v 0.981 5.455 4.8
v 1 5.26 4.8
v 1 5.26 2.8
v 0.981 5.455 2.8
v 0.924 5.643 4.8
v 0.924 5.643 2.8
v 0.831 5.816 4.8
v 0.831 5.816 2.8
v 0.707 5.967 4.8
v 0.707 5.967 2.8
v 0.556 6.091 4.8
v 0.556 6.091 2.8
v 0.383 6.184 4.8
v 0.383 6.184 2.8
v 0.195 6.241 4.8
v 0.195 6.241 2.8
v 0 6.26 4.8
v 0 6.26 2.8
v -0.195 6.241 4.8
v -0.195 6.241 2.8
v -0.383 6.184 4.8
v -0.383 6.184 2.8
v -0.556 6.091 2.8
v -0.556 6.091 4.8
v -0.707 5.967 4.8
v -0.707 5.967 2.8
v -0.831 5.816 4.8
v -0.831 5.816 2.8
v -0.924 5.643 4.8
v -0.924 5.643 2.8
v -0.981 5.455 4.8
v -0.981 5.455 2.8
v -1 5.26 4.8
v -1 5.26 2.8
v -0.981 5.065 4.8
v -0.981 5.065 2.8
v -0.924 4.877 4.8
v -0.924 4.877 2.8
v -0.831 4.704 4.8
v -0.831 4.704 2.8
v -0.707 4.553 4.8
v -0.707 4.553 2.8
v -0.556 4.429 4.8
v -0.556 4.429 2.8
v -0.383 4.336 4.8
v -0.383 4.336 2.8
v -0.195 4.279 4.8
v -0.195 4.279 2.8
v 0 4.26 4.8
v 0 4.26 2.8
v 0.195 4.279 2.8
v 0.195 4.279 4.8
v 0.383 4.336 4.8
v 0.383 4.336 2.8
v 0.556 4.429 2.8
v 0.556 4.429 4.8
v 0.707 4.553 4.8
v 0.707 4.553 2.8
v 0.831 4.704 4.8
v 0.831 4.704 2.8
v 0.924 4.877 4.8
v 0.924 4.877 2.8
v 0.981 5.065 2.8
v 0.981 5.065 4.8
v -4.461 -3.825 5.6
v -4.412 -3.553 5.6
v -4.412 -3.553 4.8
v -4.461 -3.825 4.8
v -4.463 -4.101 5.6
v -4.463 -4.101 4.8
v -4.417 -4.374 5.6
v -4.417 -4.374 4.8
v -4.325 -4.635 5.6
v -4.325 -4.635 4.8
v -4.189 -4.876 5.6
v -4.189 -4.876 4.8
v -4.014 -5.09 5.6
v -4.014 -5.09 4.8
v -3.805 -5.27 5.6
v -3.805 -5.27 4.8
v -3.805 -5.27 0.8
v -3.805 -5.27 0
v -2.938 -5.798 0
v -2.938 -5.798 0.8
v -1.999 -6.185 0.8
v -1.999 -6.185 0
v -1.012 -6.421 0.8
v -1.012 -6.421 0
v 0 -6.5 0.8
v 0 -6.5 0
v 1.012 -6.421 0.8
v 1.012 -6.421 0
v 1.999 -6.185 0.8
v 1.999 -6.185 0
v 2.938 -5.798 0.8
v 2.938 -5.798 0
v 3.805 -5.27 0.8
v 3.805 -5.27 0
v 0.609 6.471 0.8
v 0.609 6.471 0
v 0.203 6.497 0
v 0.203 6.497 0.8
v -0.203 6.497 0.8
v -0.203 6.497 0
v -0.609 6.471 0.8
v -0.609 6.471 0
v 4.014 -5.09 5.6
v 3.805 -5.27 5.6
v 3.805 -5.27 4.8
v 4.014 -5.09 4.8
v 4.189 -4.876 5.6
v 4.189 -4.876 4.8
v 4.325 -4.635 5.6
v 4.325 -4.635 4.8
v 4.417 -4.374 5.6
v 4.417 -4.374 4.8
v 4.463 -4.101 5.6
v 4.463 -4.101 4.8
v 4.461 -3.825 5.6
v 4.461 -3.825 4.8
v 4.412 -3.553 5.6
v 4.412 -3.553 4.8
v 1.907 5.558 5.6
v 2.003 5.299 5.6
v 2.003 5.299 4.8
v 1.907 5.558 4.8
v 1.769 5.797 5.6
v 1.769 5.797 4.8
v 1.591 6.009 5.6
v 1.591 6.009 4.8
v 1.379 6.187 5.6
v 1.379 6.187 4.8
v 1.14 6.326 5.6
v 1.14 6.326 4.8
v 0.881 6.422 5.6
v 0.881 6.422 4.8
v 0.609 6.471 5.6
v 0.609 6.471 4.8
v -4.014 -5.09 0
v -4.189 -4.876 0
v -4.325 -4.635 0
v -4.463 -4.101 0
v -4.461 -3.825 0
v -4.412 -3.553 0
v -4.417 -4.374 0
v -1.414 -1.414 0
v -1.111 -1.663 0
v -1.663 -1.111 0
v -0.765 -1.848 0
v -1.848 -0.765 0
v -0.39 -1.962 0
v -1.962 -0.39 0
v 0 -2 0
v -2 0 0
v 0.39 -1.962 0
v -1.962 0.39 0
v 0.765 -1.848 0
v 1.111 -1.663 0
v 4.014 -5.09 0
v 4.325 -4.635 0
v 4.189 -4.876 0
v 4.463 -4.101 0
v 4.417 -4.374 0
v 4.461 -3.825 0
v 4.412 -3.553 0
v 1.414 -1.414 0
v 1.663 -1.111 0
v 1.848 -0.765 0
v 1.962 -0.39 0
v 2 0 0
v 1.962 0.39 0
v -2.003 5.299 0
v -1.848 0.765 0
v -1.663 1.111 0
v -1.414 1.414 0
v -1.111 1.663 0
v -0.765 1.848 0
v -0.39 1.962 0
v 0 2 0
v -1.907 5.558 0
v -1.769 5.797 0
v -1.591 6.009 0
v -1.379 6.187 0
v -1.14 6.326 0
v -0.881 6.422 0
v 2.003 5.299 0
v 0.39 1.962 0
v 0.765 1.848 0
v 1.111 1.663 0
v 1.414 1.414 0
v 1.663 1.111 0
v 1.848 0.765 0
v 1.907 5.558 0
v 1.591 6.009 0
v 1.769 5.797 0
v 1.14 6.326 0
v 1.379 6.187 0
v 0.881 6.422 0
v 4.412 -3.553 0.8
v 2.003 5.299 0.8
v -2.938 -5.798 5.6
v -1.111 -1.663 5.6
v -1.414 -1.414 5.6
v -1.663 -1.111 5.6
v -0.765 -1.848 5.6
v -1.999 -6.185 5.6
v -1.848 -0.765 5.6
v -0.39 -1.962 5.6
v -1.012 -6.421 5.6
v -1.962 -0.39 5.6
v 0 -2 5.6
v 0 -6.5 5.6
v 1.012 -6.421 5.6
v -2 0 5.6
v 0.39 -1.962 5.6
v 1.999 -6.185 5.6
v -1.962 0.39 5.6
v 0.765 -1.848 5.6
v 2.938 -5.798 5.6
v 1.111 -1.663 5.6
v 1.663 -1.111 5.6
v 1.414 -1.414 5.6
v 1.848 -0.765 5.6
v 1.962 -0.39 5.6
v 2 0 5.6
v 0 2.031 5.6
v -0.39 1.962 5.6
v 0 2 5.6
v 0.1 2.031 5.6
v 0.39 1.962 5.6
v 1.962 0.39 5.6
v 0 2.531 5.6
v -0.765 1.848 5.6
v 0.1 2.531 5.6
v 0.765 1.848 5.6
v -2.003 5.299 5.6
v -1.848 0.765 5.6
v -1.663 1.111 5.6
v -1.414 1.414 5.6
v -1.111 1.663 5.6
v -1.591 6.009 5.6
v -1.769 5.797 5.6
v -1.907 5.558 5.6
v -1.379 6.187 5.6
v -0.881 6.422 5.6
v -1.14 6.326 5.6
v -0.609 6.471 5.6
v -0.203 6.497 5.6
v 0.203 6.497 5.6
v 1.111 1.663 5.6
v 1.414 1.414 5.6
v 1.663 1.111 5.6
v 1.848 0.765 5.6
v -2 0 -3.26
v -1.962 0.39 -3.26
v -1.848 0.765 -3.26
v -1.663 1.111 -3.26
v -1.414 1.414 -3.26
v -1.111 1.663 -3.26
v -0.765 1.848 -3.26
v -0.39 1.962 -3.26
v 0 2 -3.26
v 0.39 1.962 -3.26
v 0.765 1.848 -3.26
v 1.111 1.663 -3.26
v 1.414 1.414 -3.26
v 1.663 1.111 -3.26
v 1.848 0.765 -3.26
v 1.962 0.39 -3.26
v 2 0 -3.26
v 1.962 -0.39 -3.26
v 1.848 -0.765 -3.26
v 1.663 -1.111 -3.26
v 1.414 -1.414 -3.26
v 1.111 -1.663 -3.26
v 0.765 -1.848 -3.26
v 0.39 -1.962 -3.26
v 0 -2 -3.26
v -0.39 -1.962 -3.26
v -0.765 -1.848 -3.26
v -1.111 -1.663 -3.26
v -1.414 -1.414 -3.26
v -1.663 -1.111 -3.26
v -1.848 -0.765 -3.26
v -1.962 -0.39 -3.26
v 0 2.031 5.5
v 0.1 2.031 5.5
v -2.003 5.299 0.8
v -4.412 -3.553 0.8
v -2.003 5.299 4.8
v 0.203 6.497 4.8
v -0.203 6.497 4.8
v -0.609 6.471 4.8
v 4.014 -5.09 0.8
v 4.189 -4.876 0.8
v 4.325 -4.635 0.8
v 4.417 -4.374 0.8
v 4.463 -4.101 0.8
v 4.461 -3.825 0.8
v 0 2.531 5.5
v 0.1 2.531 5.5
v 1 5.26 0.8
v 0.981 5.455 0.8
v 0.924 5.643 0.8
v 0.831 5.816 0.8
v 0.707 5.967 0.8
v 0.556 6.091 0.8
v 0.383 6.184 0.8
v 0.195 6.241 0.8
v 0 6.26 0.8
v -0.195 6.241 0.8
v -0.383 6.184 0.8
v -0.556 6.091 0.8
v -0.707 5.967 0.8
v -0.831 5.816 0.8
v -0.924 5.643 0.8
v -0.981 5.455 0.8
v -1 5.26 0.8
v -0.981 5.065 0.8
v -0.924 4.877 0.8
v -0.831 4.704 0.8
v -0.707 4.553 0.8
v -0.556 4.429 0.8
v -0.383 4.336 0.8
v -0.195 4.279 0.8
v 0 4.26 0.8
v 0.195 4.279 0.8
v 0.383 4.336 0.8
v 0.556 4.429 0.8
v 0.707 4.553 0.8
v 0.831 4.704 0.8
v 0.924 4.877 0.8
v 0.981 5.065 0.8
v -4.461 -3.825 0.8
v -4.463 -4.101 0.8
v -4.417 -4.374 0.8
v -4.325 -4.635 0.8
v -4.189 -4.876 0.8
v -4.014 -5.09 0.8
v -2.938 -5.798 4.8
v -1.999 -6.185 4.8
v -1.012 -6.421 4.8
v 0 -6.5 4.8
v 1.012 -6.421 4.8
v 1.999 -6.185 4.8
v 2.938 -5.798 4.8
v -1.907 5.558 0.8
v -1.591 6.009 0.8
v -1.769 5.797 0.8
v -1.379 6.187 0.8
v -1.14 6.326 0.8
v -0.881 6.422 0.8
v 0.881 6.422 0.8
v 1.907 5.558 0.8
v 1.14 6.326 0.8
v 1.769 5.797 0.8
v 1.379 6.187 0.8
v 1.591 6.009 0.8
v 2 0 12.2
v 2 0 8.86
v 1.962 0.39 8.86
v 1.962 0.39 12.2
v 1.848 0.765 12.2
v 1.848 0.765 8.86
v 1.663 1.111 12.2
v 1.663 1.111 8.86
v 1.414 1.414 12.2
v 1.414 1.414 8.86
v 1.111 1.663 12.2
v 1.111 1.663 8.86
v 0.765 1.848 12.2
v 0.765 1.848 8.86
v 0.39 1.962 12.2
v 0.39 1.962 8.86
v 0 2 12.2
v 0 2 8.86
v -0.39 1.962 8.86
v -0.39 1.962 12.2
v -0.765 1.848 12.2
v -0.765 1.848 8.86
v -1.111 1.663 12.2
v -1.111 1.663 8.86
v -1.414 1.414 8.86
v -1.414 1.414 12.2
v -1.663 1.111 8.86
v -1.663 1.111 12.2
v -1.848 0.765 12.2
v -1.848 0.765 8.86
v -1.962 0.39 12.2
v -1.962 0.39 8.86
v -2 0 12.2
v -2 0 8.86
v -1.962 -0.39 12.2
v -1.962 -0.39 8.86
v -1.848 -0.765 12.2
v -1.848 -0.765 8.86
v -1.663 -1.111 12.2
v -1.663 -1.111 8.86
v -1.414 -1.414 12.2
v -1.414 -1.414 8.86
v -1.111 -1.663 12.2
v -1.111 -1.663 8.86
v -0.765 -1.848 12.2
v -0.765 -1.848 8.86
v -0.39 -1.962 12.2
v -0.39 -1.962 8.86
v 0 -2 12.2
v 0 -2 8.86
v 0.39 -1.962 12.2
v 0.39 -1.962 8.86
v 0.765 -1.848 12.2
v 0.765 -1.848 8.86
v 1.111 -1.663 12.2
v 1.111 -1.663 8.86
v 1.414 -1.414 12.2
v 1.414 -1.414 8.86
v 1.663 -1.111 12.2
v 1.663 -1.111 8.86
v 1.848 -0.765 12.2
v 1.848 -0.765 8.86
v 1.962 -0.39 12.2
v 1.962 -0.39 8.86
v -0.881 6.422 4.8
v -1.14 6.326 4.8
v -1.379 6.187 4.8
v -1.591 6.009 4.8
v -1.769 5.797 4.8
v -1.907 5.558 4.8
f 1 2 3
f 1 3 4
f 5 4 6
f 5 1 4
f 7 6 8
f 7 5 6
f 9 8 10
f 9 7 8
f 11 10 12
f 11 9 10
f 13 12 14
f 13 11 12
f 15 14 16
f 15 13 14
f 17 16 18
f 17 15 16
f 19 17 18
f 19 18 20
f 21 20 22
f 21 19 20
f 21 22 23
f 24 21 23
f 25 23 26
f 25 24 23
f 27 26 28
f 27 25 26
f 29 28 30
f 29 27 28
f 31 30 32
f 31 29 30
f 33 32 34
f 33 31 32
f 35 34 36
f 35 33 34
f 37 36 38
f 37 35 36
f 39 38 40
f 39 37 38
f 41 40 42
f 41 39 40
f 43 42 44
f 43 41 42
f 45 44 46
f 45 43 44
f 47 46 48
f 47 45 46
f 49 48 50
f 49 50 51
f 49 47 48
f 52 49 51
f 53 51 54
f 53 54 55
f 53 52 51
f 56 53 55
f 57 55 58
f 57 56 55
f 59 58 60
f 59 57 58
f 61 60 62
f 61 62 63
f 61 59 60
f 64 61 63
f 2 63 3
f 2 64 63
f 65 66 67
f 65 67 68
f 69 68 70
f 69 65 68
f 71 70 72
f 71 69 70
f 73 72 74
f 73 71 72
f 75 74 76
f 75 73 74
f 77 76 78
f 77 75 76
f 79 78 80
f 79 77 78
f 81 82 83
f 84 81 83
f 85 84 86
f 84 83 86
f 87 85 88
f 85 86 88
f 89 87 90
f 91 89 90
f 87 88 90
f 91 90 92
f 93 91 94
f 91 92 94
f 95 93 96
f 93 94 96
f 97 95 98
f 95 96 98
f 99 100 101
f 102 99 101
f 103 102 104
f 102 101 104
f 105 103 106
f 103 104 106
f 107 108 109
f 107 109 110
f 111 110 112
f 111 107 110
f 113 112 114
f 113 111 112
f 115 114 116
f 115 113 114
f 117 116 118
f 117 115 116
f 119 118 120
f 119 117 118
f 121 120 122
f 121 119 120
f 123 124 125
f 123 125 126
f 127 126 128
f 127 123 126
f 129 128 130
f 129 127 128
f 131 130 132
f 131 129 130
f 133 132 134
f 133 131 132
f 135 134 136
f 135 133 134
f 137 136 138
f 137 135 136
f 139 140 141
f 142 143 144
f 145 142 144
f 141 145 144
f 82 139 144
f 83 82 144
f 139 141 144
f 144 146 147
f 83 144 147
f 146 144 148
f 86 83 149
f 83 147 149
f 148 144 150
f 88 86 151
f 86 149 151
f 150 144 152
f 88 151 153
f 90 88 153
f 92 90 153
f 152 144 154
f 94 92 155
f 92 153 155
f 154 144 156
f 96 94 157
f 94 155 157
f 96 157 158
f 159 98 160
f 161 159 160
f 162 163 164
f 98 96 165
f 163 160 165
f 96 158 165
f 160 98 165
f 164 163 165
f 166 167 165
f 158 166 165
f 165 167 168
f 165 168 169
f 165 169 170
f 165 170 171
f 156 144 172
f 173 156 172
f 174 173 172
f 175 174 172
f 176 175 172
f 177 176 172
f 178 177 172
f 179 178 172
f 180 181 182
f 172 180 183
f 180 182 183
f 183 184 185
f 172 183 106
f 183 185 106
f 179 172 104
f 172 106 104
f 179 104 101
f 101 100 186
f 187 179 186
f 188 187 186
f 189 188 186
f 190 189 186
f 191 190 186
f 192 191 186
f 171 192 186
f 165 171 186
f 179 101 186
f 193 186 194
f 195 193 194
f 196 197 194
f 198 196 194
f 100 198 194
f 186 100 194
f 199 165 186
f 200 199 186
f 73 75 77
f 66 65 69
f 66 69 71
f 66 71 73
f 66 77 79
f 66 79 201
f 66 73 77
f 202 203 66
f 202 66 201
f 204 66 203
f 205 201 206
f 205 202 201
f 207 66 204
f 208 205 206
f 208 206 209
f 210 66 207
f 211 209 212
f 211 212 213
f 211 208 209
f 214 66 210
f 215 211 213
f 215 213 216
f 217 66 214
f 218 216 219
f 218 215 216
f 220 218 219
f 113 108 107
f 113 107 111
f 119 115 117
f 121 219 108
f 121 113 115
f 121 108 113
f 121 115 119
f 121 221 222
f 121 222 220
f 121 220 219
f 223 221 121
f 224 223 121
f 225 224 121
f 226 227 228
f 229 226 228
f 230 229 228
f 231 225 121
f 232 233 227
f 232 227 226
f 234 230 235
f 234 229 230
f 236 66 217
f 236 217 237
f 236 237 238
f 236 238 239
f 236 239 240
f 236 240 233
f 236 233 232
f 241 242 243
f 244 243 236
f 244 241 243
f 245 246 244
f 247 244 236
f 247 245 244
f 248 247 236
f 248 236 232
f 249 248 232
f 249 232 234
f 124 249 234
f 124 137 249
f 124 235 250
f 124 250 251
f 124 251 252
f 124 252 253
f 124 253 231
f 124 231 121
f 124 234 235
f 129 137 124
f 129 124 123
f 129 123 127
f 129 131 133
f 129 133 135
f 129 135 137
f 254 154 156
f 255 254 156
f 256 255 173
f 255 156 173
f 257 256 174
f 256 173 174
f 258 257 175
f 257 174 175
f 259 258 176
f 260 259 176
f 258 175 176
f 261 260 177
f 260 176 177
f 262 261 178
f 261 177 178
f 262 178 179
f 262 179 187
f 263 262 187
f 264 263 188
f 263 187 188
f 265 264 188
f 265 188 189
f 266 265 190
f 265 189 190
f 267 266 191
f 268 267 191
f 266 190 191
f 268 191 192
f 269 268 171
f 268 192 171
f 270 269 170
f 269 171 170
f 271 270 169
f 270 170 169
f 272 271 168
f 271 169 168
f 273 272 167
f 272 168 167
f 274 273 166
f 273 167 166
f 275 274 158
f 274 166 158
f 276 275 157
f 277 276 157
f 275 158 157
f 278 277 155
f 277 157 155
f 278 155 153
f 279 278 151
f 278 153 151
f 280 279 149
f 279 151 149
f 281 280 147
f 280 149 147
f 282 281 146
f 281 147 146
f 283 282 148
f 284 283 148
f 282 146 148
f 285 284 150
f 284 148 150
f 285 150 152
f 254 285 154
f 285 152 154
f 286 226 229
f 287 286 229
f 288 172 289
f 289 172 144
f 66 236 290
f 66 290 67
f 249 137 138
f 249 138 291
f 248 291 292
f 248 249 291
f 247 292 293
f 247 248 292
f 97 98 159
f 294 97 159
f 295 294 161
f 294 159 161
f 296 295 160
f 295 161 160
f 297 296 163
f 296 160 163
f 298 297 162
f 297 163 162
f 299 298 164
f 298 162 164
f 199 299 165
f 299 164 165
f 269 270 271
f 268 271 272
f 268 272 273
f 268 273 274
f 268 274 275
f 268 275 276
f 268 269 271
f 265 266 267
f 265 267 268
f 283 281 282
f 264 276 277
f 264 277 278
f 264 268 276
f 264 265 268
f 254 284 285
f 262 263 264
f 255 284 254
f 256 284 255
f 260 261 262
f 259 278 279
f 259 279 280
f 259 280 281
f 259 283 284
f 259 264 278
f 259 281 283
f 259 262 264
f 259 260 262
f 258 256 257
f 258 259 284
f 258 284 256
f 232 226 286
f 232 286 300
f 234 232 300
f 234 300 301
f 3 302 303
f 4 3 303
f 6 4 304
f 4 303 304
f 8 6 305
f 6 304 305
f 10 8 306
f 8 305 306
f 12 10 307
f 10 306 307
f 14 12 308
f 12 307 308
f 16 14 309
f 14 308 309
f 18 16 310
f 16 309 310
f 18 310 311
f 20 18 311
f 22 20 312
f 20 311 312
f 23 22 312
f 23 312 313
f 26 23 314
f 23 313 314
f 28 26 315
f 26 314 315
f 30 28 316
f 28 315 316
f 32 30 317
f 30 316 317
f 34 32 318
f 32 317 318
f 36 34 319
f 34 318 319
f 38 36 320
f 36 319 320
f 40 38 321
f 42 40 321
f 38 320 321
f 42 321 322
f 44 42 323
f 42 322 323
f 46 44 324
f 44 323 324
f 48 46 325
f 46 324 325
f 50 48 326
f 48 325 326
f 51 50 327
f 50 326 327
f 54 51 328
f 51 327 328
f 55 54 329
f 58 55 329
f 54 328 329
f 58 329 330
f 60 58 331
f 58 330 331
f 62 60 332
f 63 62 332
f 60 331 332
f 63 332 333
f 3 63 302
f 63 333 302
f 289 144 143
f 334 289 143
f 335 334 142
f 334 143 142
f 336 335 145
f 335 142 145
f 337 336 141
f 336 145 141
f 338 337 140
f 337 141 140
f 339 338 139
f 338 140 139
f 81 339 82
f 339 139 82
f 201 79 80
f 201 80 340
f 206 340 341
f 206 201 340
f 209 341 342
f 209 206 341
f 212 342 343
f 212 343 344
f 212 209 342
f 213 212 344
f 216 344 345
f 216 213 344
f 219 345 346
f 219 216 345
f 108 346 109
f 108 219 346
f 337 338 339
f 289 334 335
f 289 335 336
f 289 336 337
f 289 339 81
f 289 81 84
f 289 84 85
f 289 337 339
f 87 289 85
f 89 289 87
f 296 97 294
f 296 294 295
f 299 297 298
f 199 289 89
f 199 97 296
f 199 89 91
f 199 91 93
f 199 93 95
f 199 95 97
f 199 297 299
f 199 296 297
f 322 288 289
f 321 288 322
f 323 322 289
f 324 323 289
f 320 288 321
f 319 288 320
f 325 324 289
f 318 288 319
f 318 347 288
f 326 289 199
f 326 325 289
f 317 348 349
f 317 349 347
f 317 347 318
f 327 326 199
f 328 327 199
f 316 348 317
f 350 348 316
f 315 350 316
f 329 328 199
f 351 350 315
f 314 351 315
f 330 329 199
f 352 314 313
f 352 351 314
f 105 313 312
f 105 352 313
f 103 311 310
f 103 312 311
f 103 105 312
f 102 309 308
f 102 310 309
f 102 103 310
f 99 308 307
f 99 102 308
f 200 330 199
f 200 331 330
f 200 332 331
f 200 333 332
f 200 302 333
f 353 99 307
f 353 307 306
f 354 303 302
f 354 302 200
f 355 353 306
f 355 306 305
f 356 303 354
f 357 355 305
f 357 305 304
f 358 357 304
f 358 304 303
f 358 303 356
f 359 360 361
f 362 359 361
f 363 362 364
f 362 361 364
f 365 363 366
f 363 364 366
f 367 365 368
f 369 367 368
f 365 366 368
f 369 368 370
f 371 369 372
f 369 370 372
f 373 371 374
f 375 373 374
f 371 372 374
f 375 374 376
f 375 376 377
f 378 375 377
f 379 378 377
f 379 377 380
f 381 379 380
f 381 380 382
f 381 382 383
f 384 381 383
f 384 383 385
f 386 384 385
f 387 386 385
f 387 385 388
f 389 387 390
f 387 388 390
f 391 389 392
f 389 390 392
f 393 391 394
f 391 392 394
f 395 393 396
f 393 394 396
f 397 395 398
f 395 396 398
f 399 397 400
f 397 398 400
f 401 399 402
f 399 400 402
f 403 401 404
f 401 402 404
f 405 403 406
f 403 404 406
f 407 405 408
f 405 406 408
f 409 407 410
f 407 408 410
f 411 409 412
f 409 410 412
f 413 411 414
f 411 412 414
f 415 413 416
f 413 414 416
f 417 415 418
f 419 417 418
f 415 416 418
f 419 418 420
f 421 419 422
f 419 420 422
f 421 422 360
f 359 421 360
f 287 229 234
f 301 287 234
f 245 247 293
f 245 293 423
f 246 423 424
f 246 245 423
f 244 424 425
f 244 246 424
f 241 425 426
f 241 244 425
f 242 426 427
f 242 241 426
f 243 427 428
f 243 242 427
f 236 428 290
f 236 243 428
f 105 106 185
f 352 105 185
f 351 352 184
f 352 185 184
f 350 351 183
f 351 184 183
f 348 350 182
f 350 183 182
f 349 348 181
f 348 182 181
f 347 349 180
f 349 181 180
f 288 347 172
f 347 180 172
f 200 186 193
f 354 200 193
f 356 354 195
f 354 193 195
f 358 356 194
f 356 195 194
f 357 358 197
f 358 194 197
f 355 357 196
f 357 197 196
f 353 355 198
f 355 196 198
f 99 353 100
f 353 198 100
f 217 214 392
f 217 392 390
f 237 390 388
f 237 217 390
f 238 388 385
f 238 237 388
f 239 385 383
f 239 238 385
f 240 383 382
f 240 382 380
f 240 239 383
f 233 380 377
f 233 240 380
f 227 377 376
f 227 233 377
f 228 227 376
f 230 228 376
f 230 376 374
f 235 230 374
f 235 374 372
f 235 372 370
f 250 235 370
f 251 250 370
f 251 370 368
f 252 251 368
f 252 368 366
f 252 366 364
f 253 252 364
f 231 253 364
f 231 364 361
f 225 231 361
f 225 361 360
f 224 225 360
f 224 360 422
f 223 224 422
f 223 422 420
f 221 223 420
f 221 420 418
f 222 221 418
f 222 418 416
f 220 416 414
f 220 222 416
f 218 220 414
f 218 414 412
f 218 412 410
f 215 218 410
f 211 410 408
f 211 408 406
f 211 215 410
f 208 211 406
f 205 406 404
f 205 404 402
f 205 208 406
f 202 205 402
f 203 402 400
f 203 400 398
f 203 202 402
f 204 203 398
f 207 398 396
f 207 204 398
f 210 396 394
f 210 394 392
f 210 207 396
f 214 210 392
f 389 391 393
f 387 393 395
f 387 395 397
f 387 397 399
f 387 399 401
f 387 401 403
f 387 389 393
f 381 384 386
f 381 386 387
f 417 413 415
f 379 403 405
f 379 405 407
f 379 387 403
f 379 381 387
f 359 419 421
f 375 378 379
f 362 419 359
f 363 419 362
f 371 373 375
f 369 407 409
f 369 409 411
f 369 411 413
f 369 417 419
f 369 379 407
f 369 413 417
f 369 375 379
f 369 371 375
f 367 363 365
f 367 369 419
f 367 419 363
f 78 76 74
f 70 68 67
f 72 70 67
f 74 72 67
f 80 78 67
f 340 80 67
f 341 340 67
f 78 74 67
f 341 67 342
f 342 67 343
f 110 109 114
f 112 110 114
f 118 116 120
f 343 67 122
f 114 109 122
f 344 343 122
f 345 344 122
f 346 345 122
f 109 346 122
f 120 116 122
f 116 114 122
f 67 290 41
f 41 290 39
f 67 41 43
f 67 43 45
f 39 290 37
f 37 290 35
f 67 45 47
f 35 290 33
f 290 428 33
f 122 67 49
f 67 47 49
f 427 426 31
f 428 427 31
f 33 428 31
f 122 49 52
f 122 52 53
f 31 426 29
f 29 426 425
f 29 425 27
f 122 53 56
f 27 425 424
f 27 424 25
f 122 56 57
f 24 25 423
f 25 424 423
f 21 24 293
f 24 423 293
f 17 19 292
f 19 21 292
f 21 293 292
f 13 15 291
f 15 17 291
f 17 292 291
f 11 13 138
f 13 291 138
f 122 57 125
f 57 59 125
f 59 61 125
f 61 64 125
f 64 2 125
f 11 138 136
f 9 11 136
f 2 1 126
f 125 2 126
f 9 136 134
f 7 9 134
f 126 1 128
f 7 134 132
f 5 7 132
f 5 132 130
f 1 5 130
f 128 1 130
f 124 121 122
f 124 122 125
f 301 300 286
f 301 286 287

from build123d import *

# Parameters (mm, degrees)
BOSS_EXTRUDE1_DEPTH = 0.8
SKETCH3_R           = 1
BOSS_EXTRUDE2_DEPTH = 2
SKETCH4_R           = 2
BOSS_EXTRUDE3_DEPTH = 3.26
SKETCH5_R           = 2
BOSS_EXTRUDE4_DEPTH = 3.34
SKETCH6_W           = 0.1
SKETCH6_H           = 0.5
CUT_EXTRUDE1_DEPTH  = 0.1


with BuildPart() as part:
    # Sketch2 → Boss-Extrude1 (new body)
    with BuildSketch(Plane.XY):
        with BuildLine():
            Line((-2.002843202, 5.298630925), (-4.411867861, -3.552786589))
            ThreePointArc((-4.411867861, -3.552786589), (-4.376483825, -4.506396112), (-3.804522508, -5.270256966))
            ThreePointArc((-3.804522508, -5.270256966), (0, -6.5), (3.804522508, -5.270256966))
            ThreePointArc((3.804522508, -5.270256966), (4.376483825, -4.506396112), (4.411867861, -3.552786589))
            Line((4.411867861, -3.552786589), (2.002843202, 5.298630925))
            ThreePointArc((2.002843202, 5.298630925), (1.489063424, 6.102778606), (0.608877551, 6.471419329))
            ThreePointArc((0.608877551, 6.471419329), (0, 6.5), (-0.608877551, 6.471419329))
            ThreePointArc((-0.608877551, 6.471419329), (-1.489063424, 6.102778606), (-2.002843202, 5.298630925))
        make_face()
    extrude(amount=BOSS_EXTRUDE1_DEPTH)

    # Sketch3 → Boss-Extrude2 (add)
    with BuildSketch(Plane.XY.offset(0.8)):
        with Locations((0, 5.26)):
            Circle(SKETCH3_R)
    extrude(amount=BOSS_EXTRUDE2_DEPTH)

    # Sketch4 → Boss-Extrude3 (add)
    with BuildSketch(Plane(origin=(0, 0, 0), x_dir=(-1, 0, 0), z_dir=(0, 0, -1))):
        Circle(SKETCH4_R)
    extrude(amount=BOSS_EXTRUDE3_DEPTH)

    # Mirror1: part across plane


with BuildPart() as part_1:
    add(part.part)
    add(part.part.mirror(Plane(origin=(0, 5.26, 2.8), x_dir=(1, 0, 0), z_dir=(0, 0, 1))))

    # Sketch5 → Boss-Extrude4 (add)
    with BuildSketch(Plane.XY.offset(8.86)):
        Circle(SKETCH5_R)
    extrude(amount=BOSS_EXTRUDE4_DEPTH)

    # Sketch6 → Cut-Extrude1 (cut)
    with BuildSketch(Plane.XY.offset(5.6)):
        with Locations((0.05, 2.280573289)):
            Rectangle(SKETCH6_W, SKETCH6_H)
    extrude(amount=-CUT_EXTRUDE1_DEPTH, mode=Mode.SUBTRACT)


solid = part_1.part
